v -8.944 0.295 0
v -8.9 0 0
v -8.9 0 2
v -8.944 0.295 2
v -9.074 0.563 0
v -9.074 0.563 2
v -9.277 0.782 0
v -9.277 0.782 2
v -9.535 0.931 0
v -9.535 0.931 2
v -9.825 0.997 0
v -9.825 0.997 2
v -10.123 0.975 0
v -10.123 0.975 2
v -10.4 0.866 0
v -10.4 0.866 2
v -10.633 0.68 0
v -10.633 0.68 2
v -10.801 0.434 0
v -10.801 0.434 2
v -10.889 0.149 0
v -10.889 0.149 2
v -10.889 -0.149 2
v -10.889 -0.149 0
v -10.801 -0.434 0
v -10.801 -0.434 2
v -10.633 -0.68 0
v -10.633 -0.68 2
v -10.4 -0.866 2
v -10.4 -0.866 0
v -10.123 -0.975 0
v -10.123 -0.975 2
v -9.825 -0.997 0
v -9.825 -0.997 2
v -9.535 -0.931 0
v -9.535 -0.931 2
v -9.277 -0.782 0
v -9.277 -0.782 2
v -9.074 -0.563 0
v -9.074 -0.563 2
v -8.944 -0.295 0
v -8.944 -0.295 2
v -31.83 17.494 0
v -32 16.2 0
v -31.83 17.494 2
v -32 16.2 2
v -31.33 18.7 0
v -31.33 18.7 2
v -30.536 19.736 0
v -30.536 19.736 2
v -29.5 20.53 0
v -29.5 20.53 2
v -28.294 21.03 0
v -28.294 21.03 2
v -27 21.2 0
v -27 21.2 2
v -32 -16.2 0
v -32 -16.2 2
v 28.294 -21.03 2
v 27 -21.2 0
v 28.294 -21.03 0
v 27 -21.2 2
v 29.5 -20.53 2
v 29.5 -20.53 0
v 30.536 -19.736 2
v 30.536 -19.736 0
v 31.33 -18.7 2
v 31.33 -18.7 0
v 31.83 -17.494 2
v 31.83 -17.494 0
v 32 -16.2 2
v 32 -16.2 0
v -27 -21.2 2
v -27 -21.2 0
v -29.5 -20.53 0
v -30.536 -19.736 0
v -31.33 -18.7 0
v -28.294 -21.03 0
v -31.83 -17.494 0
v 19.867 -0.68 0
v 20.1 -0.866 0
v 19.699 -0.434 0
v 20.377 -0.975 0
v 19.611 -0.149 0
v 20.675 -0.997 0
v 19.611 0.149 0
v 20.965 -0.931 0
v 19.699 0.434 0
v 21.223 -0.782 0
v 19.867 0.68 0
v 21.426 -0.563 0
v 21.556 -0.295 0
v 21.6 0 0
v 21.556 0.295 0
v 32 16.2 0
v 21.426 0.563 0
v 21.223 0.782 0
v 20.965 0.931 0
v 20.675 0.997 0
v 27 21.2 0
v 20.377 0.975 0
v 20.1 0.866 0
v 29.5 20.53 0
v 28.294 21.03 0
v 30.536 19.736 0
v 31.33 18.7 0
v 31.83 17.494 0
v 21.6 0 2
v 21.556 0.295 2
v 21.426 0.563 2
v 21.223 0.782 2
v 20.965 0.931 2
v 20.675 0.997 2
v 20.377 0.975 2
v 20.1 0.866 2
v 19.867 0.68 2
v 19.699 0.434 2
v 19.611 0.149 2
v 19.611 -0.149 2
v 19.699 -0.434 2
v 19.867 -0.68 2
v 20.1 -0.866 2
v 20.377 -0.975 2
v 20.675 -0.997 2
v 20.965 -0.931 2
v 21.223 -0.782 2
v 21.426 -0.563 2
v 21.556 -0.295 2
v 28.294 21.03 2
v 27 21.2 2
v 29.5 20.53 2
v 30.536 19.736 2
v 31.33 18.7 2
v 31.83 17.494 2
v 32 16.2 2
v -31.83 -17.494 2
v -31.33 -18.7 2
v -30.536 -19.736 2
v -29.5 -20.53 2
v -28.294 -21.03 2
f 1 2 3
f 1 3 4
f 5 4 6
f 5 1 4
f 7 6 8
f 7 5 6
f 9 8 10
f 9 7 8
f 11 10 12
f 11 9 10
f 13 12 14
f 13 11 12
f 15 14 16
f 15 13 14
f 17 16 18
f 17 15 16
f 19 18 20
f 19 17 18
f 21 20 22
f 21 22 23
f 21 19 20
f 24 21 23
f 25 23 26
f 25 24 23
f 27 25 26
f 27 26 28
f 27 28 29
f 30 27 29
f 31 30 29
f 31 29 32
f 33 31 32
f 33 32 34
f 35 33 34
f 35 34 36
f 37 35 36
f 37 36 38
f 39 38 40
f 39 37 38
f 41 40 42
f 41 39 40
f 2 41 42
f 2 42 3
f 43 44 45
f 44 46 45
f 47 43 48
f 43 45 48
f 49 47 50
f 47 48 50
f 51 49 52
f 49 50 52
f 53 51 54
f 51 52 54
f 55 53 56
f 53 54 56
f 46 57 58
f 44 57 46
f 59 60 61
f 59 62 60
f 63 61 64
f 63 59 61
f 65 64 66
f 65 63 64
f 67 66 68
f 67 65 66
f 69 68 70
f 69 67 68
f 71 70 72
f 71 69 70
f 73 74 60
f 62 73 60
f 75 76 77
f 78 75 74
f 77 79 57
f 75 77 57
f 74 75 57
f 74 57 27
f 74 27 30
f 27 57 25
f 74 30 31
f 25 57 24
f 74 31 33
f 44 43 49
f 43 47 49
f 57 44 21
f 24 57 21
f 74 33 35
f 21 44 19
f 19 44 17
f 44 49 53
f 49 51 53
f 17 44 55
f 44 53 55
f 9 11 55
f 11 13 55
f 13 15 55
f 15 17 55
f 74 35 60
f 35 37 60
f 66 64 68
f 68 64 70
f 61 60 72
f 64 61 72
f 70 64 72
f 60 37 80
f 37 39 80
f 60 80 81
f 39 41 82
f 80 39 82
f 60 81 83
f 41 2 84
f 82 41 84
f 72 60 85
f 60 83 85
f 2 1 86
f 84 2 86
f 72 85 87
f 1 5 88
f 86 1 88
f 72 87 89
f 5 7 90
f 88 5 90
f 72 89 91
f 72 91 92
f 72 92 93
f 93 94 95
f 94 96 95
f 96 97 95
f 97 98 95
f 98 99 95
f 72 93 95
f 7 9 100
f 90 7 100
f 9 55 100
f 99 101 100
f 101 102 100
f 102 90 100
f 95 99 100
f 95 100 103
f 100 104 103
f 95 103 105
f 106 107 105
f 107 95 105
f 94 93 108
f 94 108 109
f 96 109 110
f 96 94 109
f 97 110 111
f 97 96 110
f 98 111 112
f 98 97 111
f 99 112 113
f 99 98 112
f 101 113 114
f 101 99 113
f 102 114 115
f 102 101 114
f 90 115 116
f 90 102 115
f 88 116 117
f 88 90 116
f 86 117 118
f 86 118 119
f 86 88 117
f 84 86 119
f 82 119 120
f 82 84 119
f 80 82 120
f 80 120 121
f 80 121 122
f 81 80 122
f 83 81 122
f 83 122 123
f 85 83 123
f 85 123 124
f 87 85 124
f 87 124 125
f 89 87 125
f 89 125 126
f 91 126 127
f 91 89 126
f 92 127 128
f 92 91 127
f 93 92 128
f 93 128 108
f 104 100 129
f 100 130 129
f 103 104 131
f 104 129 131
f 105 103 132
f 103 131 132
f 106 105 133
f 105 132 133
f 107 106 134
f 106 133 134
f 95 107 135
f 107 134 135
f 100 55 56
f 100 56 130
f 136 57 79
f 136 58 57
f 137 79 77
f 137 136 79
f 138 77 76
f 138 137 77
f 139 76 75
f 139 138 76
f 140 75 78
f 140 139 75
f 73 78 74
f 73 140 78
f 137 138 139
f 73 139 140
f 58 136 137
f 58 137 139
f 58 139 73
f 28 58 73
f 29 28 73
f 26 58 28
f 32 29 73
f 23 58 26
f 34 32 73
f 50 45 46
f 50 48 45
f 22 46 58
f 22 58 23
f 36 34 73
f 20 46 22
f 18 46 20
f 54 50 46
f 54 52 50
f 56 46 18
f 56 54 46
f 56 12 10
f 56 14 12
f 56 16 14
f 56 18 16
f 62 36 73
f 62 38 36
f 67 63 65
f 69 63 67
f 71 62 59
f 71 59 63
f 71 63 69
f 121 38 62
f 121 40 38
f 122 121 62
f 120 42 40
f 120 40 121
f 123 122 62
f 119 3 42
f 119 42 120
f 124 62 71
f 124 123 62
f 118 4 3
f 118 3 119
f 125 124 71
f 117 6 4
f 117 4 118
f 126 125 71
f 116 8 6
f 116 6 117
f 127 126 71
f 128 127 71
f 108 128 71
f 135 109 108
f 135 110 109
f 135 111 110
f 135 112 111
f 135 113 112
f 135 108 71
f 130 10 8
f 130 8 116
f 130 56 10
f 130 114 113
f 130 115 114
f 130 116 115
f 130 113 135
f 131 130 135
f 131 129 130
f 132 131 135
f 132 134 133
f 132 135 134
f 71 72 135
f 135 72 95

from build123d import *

# Parameters (mm, degrees)
F0_W     = 64
F0_H     = 42.4
F0_R     = 1
F1_DEPTH = 2
F2_R     = 5


with BuildPart() as f1:
    # F0 (on Top) → F1 (new body)
    with BuildSketch(Plane.XY):
        Rectangle(F0_W, F0_H)
        with Locations((-9.9, 0)):
            Circle(F0_R, mode=Mode.SUBTRACT)
        with Locations((20.6, 0)):
            Circle(F0_R, mode=Mode.SUBTRACT)
    extrude(amount=F1_DEPTH)

    # F2
    f2_edges = [f1.edges().sort_by_distance(p)[0] for p in [
        (32, -21.2, 1),
        (32, 21.2, 1),
        (-32, 21.2, 1),
        (-32, -21.2, 1),
    ]]
    fillet(f2_edges, radius=F2_R)


solid = f1.part
